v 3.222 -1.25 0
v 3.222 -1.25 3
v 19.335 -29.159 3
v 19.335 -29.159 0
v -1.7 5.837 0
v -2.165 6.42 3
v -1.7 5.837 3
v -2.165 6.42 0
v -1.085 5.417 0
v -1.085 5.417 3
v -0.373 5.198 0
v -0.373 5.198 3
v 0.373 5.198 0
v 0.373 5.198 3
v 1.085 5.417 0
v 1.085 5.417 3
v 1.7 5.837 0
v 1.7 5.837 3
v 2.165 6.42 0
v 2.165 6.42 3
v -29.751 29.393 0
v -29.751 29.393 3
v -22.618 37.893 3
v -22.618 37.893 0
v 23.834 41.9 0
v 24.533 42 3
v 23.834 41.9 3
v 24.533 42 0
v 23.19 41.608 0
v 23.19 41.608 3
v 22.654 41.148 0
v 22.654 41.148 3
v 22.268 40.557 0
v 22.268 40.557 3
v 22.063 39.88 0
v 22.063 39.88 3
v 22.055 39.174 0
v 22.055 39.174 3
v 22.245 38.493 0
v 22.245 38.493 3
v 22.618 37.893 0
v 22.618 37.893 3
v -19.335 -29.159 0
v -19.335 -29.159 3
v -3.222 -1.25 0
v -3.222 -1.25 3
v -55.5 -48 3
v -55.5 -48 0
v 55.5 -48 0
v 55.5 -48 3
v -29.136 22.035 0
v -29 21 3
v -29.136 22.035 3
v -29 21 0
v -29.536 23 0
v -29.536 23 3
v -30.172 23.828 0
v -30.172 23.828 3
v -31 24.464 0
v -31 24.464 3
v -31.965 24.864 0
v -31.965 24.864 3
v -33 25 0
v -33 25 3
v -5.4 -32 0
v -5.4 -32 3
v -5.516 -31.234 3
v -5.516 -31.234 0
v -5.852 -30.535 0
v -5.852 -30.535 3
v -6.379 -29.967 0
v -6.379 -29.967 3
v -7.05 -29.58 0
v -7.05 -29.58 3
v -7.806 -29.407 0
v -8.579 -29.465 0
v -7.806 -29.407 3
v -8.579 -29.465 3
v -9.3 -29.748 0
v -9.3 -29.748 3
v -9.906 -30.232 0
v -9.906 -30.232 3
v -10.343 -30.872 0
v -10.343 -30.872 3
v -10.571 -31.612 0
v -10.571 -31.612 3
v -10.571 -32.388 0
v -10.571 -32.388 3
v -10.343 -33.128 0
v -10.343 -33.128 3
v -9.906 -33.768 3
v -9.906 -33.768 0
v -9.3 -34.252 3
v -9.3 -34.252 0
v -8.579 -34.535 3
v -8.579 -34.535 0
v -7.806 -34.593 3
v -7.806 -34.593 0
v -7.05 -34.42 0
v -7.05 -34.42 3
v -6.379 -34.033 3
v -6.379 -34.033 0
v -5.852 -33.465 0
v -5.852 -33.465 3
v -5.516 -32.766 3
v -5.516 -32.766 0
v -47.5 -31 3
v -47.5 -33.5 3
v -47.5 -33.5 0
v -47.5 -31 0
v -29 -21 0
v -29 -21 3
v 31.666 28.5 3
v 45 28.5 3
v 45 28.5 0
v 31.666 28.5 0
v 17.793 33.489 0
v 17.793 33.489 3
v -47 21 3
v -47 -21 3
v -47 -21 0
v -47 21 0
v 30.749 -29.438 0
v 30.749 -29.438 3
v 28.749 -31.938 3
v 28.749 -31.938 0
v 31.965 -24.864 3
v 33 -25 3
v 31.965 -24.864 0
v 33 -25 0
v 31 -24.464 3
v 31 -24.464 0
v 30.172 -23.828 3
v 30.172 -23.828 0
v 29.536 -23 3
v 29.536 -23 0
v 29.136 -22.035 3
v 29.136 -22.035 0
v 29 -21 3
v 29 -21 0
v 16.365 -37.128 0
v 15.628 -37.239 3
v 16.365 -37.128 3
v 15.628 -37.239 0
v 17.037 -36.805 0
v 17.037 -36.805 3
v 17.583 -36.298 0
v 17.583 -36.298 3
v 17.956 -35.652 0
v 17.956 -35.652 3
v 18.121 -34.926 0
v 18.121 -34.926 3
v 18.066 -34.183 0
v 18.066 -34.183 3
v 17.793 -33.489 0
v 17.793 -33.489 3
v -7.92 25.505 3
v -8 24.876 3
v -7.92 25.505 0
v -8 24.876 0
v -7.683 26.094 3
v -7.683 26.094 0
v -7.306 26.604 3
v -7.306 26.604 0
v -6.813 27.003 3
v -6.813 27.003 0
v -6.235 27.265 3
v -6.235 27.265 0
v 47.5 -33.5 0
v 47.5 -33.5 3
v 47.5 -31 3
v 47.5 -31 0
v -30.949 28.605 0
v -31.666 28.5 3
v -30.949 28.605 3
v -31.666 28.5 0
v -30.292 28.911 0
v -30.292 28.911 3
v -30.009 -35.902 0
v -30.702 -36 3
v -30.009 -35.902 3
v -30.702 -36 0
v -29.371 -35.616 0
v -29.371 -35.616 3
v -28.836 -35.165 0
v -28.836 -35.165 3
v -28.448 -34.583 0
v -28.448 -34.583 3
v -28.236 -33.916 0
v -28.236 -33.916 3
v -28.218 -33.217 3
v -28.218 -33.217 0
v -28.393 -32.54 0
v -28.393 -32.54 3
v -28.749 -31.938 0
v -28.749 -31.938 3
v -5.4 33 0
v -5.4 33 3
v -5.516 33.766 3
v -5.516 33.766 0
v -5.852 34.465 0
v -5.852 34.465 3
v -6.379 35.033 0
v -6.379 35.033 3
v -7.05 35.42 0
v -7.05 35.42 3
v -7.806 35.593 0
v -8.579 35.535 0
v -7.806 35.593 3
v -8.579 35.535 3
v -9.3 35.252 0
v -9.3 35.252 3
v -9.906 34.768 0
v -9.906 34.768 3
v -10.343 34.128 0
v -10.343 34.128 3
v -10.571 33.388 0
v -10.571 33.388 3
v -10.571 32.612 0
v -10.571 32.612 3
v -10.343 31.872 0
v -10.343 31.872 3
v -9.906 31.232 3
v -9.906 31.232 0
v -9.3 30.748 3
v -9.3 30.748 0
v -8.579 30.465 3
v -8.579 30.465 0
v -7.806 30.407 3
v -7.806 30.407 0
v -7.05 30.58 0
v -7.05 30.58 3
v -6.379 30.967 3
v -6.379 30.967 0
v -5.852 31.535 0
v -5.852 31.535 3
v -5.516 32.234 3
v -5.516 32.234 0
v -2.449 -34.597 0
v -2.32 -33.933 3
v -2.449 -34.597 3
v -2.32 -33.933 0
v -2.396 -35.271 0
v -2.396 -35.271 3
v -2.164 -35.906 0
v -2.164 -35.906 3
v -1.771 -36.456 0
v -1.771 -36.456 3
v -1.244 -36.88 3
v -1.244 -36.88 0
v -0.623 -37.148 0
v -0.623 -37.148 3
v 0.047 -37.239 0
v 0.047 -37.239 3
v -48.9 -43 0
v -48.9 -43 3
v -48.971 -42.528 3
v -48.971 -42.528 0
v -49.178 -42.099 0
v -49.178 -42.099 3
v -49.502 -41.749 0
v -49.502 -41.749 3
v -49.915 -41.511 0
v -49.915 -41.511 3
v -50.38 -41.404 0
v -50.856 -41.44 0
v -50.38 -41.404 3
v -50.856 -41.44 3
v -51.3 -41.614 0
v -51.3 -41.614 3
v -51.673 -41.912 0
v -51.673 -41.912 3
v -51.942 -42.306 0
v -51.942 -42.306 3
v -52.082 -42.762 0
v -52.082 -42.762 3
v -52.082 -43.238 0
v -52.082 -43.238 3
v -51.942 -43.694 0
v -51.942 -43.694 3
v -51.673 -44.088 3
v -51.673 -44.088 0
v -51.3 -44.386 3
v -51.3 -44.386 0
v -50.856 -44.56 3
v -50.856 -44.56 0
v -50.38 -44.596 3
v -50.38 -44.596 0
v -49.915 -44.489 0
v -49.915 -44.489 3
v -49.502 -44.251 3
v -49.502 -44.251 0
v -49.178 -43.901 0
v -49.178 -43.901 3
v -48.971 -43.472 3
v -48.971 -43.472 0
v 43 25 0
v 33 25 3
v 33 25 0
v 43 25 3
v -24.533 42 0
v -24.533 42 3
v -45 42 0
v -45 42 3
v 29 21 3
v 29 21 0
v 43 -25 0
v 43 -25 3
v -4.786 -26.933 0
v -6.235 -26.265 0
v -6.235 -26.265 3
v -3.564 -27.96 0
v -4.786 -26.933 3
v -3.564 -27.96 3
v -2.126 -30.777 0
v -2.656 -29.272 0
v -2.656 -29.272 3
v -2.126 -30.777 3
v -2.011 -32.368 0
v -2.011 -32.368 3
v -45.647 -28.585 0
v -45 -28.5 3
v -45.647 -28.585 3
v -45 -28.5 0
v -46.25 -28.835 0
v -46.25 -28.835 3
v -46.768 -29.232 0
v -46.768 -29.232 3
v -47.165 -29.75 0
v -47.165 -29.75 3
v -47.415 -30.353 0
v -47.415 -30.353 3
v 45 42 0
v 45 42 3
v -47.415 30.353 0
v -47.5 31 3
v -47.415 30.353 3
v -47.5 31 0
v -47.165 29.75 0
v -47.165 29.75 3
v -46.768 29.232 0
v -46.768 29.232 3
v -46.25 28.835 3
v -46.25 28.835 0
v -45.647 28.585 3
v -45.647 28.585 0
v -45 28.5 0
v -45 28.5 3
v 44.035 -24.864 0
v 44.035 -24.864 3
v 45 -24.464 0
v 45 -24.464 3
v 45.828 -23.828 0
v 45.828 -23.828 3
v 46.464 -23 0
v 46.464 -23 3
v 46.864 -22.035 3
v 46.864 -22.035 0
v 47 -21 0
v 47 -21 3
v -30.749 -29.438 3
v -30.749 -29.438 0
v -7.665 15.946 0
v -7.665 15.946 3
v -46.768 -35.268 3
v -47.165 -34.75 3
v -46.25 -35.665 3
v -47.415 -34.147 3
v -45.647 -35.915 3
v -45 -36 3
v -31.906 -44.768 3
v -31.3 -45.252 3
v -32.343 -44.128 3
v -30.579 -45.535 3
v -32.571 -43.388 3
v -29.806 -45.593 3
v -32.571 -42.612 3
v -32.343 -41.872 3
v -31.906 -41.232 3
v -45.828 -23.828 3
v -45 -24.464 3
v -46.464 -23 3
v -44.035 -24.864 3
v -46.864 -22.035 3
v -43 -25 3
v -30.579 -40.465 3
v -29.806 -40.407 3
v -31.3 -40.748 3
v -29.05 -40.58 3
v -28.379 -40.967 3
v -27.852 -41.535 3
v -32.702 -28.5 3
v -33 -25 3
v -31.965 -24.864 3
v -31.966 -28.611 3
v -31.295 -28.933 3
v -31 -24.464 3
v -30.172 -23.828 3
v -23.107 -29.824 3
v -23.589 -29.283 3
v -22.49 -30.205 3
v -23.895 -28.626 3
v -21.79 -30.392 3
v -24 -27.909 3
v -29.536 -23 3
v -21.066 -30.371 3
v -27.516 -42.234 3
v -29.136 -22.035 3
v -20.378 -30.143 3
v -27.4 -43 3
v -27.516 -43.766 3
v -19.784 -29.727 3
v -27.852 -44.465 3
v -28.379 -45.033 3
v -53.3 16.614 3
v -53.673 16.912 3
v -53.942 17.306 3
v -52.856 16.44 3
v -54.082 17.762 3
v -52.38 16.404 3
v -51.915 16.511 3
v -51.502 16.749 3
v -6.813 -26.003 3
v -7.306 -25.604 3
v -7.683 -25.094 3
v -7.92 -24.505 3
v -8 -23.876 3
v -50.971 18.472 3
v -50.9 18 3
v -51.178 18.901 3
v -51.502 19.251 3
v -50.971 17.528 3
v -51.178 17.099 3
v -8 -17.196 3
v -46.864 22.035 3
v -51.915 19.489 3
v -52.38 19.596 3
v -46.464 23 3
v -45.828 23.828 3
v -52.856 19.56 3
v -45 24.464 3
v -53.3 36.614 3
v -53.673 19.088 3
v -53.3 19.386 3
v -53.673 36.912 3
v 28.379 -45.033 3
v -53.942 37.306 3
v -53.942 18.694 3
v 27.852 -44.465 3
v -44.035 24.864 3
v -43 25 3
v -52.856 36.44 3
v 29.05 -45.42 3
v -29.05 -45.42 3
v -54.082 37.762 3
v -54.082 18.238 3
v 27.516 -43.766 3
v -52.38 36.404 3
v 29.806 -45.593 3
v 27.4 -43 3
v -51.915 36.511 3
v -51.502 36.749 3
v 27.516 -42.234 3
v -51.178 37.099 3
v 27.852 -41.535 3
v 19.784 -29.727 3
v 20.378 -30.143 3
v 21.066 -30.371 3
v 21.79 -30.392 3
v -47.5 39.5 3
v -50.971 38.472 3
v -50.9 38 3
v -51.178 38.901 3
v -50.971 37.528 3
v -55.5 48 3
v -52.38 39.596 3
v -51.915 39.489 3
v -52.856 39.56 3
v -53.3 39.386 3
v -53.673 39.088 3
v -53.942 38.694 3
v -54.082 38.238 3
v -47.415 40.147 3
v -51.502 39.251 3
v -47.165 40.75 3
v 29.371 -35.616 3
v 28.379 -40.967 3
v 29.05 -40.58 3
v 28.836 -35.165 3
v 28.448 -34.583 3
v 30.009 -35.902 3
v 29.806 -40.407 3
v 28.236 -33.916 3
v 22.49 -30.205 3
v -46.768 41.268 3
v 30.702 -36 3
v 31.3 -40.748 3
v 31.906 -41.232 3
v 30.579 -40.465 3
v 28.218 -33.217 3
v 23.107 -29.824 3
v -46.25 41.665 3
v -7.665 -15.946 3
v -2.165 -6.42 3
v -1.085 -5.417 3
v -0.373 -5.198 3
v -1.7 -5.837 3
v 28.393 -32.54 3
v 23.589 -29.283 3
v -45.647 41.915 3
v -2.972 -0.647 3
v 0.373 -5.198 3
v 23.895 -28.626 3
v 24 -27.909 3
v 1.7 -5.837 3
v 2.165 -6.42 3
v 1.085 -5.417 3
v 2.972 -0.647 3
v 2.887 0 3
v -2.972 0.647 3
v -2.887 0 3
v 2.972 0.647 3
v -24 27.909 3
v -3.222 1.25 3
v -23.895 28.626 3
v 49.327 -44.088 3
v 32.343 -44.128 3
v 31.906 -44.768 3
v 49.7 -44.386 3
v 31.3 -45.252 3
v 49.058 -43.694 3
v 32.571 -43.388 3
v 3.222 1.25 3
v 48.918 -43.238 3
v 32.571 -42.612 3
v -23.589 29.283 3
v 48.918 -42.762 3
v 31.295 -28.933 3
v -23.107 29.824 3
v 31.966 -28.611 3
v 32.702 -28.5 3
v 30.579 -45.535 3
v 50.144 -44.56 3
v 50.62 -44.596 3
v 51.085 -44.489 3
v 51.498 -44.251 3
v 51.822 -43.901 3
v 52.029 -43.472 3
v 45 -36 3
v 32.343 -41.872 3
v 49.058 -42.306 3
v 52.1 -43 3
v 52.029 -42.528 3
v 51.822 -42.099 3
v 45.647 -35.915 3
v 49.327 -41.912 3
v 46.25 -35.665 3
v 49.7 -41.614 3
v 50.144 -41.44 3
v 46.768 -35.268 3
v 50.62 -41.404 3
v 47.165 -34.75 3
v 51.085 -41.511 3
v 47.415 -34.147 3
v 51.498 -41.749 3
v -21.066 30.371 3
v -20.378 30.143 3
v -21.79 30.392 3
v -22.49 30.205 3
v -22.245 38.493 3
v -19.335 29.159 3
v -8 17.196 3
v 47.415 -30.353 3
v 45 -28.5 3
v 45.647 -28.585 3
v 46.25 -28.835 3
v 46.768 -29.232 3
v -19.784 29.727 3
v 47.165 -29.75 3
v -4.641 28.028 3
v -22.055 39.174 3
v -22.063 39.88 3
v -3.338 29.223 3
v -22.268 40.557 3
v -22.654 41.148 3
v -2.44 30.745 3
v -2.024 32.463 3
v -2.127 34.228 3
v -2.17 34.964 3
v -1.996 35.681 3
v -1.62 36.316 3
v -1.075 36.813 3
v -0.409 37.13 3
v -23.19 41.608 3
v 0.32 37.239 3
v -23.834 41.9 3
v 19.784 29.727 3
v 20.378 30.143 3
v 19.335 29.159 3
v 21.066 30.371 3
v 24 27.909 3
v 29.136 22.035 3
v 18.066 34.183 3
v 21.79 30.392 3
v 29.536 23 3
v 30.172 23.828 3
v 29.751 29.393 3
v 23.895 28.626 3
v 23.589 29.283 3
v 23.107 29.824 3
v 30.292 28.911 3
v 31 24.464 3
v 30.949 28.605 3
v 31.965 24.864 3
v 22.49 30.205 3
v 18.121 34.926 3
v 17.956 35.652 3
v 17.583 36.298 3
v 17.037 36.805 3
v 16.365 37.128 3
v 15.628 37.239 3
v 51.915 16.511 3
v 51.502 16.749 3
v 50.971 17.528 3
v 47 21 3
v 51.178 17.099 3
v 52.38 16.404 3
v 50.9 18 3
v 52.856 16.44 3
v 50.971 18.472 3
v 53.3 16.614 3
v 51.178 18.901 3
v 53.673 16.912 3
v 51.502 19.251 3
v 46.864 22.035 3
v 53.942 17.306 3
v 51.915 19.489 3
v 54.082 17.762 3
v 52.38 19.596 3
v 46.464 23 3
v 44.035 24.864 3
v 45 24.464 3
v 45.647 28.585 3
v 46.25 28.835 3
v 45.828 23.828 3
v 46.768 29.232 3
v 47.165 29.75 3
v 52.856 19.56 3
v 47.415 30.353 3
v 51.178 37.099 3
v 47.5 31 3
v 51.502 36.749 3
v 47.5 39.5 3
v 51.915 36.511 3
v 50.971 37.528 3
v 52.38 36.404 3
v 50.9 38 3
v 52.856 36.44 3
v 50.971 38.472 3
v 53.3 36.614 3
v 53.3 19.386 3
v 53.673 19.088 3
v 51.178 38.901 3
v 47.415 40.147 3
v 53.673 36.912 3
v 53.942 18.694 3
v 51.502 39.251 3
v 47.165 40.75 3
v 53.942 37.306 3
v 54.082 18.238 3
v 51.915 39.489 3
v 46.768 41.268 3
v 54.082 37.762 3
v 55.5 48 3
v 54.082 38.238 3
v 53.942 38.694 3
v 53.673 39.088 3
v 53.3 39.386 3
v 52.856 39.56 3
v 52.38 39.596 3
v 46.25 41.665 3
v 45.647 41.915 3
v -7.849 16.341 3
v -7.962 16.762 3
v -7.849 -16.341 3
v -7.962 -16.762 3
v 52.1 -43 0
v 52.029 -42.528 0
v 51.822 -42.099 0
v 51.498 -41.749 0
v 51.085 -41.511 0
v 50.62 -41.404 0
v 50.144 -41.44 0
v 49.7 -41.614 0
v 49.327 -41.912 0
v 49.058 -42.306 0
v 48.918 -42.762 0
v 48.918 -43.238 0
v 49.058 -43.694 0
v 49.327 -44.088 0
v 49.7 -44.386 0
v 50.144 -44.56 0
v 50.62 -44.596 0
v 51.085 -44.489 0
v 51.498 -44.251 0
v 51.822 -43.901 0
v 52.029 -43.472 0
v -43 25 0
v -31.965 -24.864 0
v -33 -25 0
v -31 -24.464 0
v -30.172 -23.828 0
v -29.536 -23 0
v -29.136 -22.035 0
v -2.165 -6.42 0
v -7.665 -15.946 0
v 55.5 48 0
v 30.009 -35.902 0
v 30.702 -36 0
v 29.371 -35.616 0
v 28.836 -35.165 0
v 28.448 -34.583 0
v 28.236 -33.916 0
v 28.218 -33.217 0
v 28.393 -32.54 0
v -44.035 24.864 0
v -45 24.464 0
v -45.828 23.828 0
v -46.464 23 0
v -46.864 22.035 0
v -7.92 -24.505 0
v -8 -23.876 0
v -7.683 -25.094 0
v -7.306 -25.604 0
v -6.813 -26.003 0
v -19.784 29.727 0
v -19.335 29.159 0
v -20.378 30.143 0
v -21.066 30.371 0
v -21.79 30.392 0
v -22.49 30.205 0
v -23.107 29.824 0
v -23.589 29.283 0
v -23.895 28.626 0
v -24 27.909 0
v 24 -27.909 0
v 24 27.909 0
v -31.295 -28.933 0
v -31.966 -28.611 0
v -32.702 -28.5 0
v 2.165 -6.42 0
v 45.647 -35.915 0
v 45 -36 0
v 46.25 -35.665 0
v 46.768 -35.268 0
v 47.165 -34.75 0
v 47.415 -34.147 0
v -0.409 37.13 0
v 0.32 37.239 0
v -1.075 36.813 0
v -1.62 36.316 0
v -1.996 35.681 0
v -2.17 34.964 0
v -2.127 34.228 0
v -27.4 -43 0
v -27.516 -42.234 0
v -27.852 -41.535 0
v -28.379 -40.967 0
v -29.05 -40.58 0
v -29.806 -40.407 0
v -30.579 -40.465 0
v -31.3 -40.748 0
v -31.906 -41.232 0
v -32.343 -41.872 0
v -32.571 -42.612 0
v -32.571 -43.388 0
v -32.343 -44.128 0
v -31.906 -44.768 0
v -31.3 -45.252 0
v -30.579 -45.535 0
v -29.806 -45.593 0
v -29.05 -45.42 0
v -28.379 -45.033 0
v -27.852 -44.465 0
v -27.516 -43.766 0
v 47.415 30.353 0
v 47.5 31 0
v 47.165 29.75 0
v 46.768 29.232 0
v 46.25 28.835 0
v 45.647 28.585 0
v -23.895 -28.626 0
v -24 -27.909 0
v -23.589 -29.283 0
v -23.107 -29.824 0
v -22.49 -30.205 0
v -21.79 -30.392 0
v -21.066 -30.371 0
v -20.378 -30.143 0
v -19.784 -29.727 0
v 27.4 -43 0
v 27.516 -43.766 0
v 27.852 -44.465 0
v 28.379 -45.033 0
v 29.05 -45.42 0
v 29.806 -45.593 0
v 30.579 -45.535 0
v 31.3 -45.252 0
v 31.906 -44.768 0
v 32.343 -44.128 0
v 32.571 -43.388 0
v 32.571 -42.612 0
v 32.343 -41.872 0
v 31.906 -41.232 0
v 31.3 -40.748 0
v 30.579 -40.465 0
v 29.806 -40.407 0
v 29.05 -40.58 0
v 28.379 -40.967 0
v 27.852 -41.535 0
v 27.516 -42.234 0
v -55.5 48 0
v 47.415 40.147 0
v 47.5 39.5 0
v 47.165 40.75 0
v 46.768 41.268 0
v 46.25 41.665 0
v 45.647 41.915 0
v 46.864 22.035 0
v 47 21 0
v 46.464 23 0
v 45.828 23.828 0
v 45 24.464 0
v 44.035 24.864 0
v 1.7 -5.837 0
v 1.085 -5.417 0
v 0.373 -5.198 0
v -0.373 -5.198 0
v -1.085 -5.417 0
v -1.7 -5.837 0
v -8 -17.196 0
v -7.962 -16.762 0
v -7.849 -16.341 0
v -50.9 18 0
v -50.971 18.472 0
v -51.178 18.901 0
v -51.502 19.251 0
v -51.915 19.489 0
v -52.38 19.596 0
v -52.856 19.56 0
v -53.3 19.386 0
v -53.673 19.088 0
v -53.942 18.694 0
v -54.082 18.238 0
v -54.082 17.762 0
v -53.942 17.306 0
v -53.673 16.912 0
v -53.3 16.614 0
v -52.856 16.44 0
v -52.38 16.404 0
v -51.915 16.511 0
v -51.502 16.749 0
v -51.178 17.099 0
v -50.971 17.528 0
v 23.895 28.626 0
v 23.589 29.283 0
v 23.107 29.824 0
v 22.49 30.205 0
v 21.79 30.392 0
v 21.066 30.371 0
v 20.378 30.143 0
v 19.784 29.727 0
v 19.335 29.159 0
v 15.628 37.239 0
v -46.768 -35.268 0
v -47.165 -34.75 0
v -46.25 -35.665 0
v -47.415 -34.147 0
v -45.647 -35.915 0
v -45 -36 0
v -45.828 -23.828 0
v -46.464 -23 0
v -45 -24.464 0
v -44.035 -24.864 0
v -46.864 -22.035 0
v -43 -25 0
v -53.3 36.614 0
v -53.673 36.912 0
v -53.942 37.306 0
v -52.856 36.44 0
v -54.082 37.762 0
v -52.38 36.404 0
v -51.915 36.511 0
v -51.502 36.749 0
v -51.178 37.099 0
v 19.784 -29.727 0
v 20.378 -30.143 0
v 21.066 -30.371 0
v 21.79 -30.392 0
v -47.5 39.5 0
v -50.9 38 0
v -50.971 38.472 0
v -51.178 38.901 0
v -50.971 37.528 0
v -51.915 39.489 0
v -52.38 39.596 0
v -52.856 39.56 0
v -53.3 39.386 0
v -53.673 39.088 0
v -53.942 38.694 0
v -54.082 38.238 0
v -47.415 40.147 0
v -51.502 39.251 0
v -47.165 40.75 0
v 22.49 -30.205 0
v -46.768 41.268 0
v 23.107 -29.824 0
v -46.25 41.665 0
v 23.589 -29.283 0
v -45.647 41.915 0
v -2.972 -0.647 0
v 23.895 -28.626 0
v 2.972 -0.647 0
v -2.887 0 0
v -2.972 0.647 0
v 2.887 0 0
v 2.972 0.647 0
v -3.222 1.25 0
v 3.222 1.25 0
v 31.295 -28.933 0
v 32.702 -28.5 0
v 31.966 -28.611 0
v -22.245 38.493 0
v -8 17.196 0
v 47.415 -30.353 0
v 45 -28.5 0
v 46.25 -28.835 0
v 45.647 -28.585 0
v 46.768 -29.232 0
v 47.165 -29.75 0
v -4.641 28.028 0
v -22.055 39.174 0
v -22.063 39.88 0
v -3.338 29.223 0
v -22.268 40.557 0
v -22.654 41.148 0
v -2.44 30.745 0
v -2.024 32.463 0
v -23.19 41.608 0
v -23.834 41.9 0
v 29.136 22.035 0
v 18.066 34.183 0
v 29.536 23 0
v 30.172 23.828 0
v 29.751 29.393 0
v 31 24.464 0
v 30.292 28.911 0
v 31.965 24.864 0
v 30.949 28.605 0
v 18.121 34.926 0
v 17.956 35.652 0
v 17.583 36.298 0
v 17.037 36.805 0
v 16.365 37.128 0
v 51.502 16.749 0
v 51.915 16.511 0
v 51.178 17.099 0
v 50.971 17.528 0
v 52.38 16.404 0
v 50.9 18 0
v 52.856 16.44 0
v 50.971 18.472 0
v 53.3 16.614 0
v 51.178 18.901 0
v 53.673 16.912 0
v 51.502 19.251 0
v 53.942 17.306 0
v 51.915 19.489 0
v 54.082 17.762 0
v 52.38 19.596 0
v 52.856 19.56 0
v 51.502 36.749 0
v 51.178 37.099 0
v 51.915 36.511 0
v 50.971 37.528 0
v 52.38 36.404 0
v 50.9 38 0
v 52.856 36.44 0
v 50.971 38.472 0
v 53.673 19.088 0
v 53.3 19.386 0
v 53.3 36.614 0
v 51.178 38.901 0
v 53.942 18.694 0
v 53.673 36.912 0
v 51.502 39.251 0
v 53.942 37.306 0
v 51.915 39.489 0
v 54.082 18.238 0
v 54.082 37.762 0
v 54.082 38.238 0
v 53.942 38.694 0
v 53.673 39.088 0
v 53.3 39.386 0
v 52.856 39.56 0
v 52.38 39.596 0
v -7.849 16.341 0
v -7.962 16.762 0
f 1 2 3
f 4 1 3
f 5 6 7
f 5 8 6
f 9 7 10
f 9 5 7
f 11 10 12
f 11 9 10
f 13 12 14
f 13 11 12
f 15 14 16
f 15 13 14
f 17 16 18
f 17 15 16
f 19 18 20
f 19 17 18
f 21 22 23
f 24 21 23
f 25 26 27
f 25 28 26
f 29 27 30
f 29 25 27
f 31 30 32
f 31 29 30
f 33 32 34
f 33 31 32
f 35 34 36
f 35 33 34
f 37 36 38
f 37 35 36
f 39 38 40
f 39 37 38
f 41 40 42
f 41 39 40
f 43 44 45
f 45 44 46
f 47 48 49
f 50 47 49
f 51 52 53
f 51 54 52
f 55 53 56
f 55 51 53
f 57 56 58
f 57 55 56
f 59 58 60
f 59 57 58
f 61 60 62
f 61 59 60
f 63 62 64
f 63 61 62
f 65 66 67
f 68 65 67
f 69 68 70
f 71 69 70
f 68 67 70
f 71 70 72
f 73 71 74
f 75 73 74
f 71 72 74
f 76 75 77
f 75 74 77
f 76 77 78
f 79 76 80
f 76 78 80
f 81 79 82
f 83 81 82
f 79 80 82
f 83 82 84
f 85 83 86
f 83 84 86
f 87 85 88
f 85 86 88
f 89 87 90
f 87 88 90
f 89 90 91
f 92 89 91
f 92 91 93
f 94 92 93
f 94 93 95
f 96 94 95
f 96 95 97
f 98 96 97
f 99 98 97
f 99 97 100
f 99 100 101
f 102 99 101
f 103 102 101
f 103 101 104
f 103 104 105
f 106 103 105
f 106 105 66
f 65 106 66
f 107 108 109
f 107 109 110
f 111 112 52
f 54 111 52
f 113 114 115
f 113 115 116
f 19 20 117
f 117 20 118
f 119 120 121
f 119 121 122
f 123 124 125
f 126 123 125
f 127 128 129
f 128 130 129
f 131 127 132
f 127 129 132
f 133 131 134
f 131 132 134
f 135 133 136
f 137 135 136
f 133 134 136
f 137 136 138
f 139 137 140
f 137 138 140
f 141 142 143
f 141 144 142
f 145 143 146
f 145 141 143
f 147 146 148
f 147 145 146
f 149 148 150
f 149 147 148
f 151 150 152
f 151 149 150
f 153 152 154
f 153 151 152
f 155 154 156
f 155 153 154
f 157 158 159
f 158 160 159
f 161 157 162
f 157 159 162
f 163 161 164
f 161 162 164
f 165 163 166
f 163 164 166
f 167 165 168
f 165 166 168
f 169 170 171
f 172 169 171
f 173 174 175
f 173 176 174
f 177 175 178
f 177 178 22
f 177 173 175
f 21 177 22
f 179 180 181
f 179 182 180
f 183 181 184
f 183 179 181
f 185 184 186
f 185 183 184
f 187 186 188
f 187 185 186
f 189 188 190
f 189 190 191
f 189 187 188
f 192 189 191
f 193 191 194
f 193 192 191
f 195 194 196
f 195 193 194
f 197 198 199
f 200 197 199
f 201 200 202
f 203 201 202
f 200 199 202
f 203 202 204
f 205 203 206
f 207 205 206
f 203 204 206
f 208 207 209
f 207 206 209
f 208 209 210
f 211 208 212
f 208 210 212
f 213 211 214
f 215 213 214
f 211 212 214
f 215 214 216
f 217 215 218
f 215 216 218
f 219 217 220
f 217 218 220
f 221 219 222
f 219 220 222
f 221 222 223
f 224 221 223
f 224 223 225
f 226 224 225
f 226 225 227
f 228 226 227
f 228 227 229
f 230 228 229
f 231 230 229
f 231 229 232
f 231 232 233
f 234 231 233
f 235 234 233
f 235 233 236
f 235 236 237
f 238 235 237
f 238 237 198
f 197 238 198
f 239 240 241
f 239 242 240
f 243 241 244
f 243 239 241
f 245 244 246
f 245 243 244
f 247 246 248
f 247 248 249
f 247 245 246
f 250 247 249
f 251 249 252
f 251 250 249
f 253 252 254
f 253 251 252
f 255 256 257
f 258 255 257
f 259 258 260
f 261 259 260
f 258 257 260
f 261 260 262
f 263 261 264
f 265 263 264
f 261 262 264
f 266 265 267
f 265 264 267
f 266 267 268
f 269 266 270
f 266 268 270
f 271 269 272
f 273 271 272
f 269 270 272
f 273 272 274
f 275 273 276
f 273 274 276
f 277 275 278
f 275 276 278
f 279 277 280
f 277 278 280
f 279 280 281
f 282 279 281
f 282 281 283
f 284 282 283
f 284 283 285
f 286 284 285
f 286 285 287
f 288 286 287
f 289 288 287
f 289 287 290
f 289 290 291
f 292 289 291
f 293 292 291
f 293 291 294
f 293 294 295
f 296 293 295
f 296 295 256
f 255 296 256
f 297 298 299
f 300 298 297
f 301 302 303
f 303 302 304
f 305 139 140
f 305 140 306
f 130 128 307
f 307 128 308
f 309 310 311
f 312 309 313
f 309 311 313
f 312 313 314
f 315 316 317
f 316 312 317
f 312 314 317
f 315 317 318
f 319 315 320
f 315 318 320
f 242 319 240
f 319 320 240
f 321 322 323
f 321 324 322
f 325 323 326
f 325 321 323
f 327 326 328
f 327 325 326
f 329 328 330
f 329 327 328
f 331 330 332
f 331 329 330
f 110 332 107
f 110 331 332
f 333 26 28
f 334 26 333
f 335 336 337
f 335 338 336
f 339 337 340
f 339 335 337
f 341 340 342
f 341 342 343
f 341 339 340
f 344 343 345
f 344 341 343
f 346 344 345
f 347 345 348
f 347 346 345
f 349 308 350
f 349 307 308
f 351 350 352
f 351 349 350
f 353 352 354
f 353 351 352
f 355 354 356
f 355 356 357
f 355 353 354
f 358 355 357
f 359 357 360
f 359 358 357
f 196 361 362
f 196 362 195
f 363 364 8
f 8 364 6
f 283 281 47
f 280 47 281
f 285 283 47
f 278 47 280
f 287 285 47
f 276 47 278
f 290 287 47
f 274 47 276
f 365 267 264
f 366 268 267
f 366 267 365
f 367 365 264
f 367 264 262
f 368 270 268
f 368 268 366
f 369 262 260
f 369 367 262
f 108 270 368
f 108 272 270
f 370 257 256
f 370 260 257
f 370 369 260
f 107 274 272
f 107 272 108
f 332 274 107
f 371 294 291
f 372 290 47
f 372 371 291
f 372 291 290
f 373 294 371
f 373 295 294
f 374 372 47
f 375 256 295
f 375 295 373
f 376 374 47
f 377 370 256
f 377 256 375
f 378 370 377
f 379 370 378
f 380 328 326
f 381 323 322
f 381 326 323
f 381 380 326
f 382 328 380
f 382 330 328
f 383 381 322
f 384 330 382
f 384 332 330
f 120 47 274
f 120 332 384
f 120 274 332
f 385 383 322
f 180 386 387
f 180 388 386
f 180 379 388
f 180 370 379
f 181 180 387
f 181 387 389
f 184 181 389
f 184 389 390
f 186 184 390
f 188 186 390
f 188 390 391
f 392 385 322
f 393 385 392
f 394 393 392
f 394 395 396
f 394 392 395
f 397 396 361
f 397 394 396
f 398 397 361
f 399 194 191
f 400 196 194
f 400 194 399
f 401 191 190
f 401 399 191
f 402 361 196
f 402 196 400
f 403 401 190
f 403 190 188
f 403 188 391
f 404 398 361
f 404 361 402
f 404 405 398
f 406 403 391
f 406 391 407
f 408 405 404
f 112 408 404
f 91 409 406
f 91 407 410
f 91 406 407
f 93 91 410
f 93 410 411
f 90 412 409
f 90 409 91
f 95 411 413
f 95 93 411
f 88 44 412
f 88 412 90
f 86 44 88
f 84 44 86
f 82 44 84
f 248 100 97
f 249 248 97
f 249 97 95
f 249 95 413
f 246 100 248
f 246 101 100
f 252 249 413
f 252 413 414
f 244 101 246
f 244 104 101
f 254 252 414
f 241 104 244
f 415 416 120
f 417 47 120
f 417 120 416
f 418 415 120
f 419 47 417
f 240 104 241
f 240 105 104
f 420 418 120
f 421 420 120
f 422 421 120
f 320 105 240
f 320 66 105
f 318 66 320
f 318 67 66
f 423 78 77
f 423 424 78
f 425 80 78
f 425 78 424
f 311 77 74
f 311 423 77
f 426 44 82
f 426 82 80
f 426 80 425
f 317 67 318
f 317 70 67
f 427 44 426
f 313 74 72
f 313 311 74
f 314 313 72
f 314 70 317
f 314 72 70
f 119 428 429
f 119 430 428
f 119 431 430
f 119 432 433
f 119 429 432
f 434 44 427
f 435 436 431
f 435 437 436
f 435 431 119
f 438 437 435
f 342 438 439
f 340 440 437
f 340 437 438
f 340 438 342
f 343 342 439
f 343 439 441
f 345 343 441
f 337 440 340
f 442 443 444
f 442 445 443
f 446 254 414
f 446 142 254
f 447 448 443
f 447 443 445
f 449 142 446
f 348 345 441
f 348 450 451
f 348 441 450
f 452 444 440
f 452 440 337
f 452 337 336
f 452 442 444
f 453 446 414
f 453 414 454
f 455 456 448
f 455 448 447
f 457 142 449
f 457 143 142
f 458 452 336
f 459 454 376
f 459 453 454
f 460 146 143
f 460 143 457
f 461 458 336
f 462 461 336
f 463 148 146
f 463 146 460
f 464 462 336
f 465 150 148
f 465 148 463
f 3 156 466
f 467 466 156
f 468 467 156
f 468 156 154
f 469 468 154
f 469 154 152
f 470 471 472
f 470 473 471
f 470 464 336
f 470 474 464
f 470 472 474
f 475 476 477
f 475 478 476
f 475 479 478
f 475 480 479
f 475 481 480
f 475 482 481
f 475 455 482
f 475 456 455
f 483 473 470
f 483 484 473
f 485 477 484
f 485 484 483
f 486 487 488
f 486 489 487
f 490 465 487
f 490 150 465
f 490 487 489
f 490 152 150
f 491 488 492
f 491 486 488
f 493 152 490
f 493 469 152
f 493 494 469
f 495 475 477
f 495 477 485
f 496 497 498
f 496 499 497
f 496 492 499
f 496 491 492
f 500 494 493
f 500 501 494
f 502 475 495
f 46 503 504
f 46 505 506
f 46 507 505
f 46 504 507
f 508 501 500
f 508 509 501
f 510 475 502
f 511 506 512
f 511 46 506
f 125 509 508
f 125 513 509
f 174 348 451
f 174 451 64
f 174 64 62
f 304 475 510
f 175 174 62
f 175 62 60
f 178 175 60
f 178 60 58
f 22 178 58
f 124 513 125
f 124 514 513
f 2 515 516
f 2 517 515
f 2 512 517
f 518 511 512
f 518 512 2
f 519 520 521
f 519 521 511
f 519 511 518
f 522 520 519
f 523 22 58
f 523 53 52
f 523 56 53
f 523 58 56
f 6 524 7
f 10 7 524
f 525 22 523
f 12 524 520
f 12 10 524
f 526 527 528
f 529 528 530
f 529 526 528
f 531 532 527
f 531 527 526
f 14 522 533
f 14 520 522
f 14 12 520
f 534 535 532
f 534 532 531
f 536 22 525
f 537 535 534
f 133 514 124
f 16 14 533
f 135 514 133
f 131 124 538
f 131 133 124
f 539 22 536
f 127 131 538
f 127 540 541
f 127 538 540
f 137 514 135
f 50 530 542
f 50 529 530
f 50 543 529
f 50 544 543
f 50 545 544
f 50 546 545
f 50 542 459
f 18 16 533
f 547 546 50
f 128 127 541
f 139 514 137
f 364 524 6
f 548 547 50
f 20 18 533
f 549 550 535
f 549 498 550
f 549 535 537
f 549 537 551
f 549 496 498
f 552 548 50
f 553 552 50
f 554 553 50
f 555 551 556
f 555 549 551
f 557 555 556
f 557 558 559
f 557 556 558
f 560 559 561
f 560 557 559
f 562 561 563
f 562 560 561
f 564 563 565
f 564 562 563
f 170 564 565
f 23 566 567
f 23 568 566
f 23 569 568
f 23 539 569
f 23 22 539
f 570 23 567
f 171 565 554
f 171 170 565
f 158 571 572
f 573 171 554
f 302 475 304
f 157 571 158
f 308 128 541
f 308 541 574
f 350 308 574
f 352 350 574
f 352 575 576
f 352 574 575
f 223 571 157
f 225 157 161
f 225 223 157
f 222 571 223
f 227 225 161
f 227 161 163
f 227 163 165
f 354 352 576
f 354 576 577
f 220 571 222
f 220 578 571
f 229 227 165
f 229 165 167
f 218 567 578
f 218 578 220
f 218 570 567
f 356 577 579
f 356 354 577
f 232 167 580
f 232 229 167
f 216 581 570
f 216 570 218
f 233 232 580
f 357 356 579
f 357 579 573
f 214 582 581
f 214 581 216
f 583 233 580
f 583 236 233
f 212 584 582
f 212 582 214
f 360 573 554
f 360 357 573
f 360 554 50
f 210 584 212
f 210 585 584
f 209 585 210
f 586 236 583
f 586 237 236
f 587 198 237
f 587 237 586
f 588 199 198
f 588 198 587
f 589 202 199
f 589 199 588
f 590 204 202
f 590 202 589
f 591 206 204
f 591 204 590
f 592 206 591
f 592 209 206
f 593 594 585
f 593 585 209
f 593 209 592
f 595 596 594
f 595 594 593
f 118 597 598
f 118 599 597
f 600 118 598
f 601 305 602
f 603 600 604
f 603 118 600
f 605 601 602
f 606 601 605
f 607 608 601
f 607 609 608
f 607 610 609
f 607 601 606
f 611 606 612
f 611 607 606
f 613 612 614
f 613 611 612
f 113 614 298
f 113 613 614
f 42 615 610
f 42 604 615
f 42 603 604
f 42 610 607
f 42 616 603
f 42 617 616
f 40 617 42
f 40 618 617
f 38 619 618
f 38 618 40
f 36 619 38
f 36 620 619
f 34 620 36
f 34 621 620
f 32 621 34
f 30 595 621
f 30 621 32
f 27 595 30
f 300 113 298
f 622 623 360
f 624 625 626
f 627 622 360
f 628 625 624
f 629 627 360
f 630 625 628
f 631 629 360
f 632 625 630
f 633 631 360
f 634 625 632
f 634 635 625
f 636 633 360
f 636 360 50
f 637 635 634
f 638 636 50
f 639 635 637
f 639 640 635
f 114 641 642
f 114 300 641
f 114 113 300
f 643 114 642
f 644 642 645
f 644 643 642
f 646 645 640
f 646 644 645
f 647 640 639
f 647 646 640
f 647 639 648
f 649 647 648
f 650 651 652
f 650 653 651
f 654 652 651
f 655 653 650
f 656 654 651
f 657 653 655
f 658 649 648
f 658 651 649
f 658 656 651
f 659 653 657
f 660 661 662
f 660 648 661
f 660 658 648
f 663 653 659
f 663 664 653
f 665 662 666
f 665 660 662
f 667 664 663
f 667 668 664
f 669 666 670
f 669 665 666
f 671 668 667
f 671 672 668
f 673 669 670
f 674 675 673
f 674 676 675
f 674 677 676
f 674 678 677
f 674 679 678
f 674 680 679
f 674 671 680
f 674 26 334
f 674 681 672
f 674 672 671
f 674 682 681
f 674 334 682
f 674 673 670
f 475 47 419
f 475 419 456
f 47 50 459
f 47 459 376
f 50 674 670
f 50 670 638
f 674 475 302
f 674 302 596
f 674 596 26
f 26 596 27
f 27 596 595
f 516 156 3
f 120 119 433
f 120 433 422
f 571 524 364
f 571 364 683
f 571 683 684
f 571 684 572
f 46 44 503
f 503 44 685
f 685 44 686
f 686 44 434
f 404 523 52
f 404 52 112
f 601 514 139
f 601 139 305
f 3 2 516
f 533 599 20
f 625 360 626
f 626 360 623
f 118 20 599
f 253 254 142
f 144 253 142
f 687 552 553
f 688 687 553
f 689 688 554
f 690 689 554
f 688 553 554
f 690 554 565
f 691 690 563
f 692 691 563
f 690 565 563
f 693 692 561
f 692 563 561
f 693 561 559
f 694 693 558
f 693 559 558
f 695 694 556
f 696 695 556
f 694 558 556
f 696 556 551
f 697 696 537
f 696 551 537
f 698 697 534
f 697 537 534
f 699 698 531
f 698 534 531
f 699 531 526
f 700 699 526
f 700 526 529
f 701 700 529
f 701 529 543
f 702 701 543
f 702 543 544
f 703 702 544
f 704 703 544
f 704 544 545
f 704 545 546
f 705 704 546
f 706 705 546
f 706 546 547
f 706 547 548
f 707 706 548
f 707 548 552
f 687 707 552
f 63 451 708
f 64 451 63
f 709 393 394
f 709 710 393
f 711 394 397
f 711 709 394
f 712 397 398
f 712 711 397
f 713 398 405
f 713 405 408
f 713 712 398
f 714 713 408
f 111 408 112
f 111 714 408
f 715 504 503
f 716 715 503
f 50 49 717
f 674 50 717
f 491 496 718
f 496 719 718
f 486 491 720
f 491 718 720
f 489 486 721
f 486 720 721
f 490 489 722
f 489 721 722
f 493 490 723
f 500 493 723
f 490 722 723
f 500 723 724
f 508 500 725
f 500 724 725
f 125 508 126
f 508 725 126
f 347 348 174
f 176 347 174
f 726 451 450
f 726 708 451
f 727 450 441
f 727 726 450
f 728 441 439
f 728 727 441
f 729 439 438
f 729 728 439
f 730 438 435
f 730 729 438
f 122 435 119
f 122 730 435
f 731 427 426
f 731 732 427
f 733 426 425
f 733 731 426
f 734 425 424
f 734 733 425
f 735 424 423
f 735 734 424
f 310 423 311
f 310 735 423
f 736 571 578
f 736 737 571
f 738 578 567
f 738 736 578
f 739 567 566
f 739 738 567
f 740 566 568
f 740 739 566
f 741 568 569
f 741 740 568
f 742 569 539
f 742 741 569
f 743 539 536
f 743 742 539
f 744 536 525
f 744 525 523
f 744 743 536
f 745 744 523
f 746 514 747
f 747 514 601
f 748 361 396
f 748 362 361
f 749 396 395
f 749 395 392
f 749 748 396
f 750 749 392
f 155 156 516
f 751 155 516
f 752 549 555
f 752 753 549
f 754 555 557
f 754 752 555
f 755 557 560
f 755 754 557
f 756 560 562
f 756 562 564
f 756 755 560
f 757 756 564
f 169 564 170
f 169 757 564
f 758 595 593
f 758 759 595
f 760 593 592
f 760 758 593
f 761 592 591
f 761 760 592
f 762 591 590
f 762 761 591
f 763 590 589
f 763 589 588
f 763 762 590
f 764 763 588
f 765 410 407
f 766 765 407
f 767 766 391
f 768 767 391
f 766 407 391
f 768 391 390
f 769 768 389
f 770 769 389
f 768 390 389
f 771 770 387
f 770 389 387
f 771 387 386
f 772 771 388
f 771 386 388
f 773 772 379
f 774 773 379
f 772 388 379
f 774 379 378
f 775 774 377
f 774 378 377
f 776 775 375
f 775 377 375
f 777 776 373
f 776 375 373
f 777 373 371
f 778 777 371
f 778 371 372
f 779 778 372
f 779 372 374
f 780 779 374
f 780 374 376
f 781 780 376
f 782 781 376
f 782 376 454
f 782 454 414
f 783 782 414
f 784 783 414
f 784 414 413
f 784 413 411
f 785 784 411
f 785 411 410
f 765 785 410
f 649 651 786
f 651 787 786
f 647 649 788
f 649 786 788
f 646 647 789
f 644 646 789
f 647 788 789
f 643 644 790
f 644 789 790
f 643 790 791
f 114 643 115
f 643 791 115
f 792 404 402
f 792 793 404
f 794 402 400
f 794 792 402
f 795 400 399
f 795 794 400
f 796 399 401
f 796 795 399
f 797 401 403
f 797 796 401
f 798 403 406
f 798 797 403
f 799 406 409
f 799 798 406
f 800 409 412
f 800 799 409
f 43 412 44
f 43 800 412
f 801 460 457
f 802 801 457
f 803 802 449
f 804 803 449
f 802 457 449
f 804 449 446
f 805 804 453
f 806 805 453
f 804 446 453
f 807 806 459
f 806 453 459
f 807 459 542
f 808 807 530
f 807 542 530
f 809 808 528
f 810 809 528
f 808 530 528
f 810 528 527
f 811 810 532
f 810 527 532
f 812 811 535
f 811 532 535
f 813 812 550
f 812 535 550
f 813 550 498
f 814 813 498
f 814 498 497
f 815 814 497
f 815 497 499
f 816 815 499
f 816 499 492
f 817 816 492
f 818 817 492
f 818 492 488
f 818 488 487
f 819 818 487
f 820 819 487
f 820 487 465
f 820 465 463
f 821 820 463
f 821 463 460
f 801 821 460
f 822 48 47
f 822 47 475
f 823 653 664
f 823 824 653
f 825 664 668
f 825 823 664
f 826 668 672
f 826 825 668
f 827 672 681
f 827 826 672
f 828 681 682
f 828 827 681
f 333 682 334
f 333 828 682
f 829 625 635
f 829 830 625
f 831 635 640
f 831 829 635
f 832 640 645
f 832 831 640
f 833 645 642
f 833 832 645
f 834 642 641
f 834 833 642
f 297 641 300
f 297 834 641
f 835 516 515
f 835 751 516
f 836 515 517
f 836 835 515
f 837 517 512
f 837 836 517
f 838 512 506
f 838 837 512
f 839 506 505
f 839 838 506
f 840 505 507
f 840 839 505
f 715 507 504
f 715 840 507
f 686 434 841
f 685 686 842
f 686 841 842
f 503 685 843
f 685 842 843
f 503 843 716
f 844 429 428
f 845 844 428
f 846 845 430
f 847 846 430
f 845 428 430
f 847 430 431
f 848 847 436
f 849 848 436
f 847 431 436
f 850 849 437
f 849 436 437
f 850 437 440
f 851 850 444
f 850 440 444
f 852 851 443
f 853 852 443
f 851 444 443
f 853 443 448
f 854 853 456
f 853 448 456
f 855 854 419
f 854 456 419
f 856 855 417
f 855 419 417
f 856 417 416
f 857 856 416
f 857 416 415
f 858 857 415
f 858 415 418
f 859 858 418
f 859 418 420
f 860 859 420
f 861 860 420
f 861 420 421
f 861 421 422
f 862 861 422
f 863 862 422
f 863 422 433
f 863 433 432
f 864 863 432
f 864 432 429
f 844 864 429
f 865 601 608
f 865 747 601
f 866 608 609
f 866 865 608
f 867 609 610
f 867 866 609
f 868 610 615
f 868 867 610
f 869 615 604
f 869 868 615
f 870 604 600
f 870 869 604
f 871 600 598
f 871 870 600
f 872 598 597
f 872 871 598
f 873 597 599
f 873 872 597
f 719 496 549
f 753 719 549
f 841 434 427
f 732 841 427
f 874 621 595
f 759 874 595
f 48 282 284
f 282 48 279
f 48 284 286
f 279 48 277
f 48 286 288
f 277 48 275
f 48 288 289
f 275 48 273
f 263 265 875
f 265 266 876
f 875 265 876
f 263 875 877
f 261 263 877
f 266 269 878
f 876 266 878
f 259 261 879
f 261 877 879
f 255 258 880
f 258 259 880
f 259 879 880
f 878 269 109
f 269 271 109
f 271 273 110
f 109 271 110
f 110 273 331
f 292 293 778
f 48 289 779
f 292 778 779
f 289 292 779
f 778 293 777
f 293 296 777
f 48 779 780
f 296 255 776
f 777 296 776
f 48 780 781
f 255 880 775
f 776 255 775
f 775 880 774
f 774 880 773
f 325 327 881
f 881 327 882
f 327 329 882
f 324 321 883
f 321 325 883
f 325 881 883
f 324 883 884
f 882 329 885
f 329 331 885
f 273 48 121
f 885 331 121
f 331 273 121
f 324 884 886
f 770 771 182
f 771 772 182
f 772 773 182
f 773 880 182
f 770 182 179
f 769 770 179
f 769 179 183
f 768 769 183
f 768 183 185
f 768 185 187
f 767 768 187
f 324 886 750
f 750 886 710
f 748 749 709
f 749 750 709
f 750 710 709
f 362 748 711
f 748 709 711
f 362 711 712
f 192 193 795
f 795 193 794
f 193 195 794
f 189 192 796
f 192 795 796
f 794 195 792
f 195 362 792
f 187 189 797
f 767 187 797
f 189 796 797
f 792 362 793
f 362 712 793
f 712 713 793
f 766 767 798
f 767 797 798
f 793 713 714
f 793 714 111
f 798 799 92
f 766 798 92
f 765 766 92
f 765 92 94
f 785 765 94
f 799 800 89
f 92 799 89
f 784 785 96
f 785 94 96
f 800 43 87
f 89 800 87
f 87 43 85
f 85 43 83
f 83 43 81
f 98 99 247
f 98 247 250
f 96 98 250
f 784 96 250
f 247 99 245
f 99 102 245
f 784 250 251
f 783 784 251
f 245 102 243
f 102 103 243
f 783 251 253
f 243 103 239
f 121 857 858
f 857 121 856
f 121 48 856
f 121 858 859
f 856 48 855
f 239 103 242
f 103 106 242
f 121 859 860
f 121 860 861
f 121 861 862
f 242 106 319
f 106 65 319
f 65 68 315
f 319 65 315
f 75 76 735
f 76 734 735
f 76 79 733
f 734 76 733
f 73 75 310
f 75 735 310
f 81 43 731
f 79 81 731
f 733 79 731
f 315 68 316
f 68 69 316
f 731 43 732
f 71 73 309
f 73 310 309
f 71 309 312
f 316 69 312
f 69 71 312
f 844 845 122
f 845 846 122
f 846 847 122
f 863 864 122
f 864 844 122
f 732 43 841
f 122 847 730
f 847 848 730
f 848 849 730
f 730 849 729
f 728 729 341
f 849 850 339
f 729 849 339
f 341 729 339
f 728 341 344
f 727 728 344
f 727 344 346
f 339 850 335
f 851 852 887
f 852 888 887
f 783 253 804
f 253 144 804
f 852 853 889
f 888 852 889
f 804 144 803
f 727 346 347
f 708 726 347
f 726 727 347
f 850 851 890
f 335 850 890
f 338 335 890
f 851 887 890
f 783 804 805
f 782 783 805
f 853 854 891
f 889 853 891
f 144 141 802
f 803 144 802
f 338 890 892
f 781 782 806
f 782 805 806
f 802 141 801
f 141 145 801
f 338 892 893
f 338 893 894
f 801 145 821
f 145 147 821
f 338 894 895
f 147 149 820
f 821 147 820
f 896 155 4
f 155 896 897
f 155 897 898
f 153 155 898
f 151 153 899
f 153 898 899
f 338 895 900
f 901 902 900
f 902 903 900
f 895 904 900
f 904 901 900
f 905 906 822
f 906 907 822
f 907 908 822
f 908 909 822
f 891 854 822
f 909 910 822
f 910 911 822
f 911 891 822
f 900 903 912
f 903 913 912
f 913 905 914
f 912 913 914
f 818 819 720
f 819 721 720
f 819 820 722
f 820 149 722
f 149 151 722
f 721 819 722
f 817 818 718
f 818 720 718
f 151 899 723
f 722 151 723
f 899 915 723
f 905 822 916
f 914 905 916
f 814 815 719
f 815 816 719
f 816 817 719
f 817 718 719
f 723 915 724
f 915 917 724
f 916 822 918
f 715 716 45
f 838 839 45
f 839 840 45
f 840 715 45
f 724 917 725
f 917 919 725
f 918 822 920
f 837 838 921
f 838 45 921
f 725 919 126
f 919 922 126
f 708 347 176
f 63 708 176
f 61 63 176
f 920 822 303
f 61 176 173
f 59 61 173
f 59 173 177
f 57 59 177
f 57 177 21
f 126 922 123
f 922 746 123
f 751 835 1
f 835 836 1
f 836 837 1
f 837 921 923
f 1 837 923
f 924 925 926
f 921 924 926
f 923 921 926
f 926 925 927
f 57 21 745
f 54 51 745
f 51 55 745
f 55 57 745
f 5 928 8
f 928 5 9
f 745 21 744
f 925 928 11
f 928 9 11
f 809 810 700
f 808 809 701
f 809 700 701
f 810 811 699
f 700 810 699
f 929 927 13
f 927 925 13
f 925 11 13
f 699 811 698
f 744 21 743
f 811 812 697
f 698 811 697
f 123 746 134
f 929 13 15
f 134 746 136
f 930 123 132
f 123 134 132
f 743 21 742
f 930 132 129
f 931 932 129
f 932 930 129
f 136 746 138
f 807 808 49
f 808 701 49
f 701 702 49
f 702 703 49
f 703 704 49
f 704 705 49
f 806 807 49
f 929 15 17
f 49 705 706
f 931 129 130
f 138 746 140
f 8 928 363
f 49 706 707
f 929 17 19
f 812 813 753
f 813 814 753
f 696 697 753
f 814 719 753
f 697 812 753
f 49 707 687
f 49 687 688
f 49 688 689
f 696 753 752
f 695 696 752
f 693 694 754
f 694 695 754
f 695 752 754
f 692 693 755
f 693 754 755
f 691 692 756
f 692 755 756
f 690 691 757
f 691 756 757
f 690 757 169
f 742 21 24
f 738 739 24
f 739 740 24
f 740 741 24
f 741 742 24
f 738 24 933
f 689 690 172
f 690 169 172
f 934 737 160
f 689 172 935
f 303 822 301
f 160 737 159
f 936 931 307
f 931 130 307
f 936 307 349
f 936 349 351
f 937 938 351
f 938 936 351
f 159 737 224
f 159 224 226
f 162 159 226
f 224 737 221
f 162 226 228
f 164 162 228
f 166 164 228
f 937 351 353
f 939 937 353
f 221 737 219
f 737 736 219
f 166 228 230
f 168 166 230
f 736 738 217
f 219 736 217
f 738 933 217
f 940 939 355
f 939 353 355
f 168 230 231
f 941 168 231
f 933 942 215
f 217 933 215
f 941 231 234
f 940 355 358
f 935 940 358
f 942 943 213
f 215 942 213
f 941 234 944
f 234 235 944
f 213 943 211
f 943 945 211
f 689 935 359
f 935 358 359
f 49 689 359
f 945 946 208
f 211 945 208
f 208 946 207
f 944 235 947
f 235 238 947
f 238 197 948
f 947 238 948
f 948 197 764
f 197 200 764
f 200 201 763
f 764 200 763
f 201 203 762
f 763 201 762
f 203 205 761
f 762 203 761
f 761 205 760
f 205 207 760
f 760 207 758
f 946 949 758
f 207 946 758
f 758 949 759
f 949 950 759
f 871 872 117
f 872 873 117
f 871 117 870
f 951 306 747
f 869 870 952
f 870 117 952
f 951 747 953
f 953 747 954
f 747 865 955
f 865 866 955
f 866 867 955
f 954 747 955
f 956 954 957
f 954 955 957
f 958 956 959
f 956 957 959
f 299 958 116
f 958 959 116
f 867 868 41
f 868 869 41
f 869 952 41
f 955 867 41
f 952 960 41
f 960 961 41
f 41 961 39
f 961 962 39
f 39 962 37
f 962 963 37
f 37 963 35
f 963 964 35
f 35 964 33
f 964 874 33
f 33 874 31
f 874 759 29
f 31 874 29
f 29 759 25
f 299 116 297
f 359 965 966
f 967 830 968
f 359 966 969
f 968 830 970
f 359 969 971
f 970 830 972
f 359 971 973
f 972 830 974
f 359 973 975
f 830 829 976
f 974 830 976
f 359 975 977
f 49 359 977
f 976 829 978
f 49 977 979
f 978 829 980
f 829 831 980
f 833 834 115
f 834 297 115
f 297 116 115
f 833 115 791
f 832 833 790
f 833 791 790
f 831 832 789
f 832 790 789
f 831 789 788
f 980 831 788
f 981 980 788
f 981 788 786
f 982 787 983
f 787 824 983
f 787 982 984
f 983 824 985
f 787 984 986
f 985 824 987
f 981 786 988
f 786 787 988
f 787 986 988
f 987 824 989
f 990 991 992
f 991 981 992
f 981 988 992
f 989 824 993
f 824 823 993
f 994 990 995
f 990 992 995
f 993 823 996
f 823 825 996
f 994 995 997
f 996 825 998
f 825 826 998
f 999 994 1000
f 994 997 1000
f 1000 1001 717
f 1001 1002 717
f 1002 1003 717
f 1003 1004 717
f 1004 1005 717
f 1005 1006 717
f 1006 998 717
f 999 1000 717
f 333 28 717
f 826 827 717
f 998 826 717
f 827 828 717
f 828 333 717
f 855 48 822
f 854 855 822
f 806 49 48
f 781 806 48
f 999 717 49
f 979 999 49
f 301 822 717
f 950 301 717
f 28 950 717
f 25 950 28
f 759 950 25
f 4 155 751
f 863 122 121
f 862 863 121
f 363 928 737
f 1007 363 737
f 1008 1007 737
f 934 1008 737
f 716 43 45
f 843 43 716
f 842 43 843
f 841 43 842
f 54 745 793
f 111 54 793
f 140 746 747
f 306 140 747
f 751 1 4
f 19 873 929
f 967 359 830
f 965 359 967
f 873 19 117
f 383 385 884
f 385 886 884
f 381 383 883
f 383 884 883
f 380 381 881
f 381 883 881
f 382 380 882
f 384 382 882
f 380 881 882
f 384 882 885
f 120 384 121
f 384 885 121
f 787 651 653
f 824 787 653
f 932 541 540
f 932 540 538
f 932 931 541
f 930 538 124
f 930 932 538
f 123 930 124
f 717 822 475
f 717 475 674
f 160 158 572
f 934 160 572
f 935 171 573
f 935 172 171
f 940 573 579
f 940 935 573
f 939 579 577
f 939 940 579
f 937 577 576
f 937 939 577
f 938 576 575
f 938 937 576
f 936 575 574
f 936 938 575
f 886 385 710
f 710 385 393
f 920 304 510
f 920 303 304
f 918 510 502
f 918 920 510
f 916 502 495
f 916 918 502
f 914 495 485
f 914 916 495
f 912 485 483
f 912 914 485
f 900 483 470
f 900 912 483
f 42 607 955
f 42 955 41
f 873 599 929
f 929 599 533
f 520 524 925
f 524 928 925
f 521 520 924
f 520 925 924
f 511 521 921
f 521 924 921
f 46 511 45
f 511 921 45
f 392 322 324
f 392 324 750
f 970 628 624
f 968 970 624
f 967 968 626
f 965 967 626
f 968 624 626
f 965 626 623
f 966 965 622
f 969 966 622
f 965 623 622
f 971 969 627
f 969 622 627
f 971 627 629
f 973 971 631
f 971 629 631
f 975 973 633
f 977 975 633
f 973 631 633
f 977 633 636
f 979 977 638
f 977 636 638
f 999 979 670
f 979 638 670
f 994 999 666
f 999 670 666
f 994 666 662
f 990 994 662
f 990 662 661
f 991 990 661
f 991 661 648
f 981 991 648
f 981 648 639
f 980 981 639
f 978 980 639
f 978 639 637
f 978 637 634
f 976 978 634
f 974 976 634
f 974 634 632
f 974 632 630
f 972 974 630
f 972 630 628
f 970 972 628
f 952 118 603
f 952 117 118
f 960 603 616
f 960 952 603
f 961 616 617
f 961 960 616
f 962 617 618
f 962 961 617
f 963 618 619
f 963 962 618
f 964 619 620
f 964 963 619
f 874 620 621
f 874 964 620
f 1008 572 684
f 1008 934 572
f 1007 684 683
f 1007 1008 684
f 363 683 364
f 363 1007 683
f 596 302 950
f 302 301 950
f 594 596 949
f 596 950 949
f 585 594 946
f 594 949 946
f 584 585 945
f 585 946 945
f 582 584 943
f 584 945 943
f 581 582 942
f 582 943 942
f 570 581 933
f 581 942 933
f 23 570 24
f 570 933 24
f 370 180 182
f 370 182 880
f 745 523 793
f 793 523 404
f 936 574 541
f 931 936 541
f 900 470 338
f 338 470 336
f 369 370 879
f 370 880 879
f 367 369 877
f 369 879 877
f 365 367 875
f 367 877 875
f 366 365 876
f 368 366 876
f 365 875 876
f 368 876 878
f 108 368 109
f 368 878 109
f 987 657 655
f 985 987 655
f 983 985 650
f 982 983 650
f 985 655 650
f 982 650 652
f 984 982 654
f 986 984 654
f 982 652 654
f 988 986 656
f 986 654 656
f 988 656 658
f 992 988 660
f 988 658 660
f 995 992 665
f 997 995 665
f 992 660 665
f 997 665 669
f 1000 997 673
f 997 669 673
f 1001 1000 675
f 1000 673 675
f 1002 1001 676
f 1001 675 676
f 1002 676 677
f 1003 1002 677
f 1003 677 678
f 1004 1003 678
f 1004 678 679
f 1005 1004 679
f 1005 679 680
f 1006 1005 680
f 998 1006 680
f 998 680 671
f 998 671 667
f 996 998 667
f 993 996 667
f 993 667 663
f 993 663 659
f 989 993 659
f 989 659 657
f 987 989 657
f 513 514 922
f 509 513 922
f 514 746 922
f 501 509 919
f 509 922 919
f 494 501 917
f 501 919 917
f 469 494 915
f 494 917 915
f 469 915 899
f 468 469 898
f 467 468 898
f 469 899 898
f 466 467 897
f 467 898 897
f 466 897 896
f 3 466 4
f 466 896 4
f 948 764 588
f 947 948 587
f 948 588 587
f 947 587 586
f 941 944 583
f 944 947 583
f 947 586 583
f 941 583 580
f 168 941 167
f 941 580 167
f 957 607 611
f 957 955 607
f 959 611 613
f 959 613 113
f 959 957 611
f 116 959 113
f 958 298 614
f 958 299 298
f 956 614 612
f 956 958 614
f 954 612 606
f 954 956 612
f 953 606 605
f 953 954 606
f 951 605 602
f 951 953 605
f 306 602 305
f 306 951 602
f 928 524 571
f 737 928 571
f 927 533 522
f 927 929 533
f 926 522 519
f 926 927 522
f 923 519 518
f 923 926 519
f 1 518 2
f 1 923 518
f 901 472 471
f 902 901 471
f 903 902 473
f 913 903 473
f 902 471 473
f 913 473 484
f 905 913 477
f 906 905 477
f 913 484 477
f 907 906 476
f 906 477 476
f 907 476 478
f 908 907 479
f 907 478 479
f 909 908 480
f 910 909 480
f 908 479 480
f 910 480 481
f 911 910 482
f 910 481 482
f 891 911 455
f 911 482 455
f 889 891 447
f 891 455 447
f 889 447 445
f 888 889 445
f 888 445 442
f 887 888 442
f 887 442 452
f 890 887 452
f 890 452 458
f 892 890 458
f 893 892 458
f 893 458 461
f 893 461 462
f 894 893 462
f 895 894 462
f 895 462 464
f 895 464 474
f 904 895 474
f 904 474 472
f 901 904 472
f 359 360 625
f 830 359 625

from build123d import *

# Parameters (mm, degrees)
SKETCH_1_W           = 111
SKETCH_1_H           = 96
EXTRUDE_1_DEPTH      = 3
SKETCH_2_R           = 1.6
CUT_EXTRUDE_1_DEPTH  = 74.438749989
SKETCH_3_R           = 2.6
CUT_EXTRUDE_2_DEPTH  = 74.438749989
SKETCH_4_R           = 1.6
CUT_EXTRUDE_3_DEPTH  = 74.438749989
SKETCH_8_R           = 2.6
CUT_EXTRUDE_10_DEPTH = 74.438749989
SKETCH_5_W           = 18
SKETCH_5_H           = 50
CUT_EXTRUDE_4_DEPTH  = 74.438749989
FILLET_1_R           = 4
CUT_EXTRUDE_8_DEPTH  = 74.438749989
FILLET_2_R           = 2.5
CUT_EXTRUDE_9_DEPTH  = 74.438749989
FILLET_3_R           = 2.5


with BuildPart() as part:
    # 草图1 → 凸台-拉伸1 (new body)
    with BuildSketch(Plane.XY):
        Rectangle(SKETCH_1_W, SKETCH_1_H)
    extrude(amount=EXTRUDE_1_DEPTH)

    # 草图2 → 切除-拉伸1 (cut, through all)
    with BuildSketch(Plane.XY.offset(3)):
        with Locations((-50.5, -43)):
            Circle(SKETCH_2_R)
        with Locations((50.5, -43)):
            Circle(SKETCH_2_R)
    extrude(amount=-CUT_EXTRUDE_1_DEPTH, mode=Mode.SUBTRACT)

    # 草图3 → 切除-拉伸2 (cut, through all)
    with BuildSketch(Plane.XY.offset(3)):
        with Locations((-30, -43)):
            Circle(SKETCH_3_R)
        with Locations(Location((30, -43, 0), (0, 0, 180))):
            Circle(SKETCH_3_R)
    extrude(amount=-CUT_EXTRUDE_2_DEPTH, mode=Mode.SUBTRACT)

    # 草图4 → 切除-拉伸3 (cut, through all)
    with BuildSketch(Plane.XY.offset(3)):
        with Locations((-52.5, 18)):
            Circle(SKETCH_4_R)
        with Locations((-52.5, 38)):
            Circle(SKETCH_4_R)
        with Locations(Location((52.5, 38, 0), (0, 0, 180))):
            Circle(SKETCH_4_R)
        with Locations(Location((52.5, 18, 0), (0, 0, 180))):
            Circle(SKETCH_4_R)
    extrude(amount=-CUT_EXTRUDE_3_DEPTH, mode=Mode.SUBTRACT)

    # 草图8 → 切除-拉伸10 (cut, through all)
    with BuildSketch(Plane.XY.offset(3)):
        with Locations((-8, -32)):
            Circle(SKETCH_8_R)
        with Locations((-8, 33)):
            Circle(SKETCH_8_R)
    extrude(amount=-CUT_EXTRUDE_10_DEPTH, mode=Mode.SUBTRACT)

    # 草图5 → 切除-拉伸4 (cut, through all)
    with BuildSketch(Plane.XY.offset(3)):
        with Locations((-38, 0)):
            Rectangle(SKETCH_5_W, SKETCH_5_H)
        with Locations((38, 0)):
            Rectangle(SKETCH_5_W, SKETCH_5_H)
    extrude(amount=-CUT_EXTRUDE_4_DEPTH, mode=Mode.SUBTRACT)

    # 圆角1
    fillet_1_edges = [part.edges().sort_by_distance(p)[0] for p in [
        (-47, 25, 1.5),
        (-29, 25, 1.5),
        (-29, -25, 1.5),
        (-47, -25, 1.5),
        (47, -25, 1.5),
        (29, -25, 1.5),
        (29, 25, 1.5),
        (47, 25, 1.5),
    ]]
    fillet(fillet_1_edges, radius=FILLET_1_R)

    # 草图6 → 切除-拉伸8 (cut, through all)
    with BuildSketch(Plane.XY.offset(3)):
        with BuildLine():
            ThreePointArc((-3.753813954, 37.239092363), (-2.457683058, 30.70158252), (-8, 27))
            Line((-8, 27), (-8, 16.526279442))
            Line((-8, 16.526279442), (0, 2.669872981))
            Line((0, 2.669872981), (19.958548116, 37.239092363))
            Line((19.958548116, 37.239092363), (-3.753813954, 37.239092363))
        make_face()
        with BuildLine():
            Line((-8, -16.526279442), (-8, -26))
            ThreePointArc((-8, -26), (-2.193342004, -30.489131736), (-5.075634904, -37.239092363))
            Line((-5.075634904, -37.239092363), (19.958548116, -37.239092363))
            Line((19.958548116, -37.239092363), (0, -2.669872981))
            Line((0, -2.669872981), (-8, -16.526279442))
        make_face()
        Polygon((-2.5, 0), (-24, 37.239092363), (-24, -37.239092363), align=None)
        Polygon((24, -37.239092363), (24, 37.239092363), (2.5, 0), align=None)
    extrude(amount=-CUT_EXTRUDE_8_DEPTH, mode=Mode.SUBTRACT)

    # 圆角2
    fillet_2_edges = [part.edges().sort_by_distance(p)[0] for p in [
        (24, -37.239092363, 1.5),
        (2.5, 0, 1.5),
        (24, 37.239092363, 1.5),
        (-8, 27, 1.5),
        (-3.753813954, 37.239092363, 1.5),
        (19.958548116, 37.239092363, 1.5),
        (0, 2.669872981, 1.5),
        (-8, 16.526279442, 1.5),
        (-5.075634904, -37.239092363, 1.5),
        (-8, -26, 1.5),
        (-8, -16.526279442, 1.5),
        (0, -2.669872981, 1.5),
        (19.958548116, -37.239092363, 1.5),
        (-24, -37.239092363, 1.5),
        (-24, 37.239092363, 1.5),
        (-2.5, 0, 1.5),
    ]]
    fillet(fillet_2_edges, radius=FILLET_2_R)

    # 草图7 → 切除-拉伸9 (cut, through all)
    with BuildSketch(Plane.XY.offset(3)):
        Polygon((-19.172154979, 42), (-47.5, 42), (-47.5, 38), (-47.5, 28.5), (-30.5, 28.5), align=None)
        Polygon((-47.5, -36), (-47.5, -28.5), (-31.5, -28.5), (-25.5, -36), align=None)
        Polygon((25.5, -36), (47.5, -36), (47.5, -28.5), (31.5, -28.5), align=None)
        Polygon((47.5, 42), (47.5, 38), (47.5, 28.5), (30.5, 28.5), (19.172154979, 42), align=None)
    extrude(amount=-CUT_EXTRUDE_9_DEPTH, mode=Mode.SUBTRACT)

    # 圆角3
    fillet_3_edges = [part.edges().sort_by_distance(p)[0] for p in [
        (47.5, 42, 1.5),
        (47.5, 28.5, 1.5),
        (30.5, 28.5, 1.5),
        (19.172154979, 42, 1.5),
        (47.5, -36, 1.5),
        (25.5, -36, 1.5),
        (31.5, -28.5, 1.5),
        (47.5, -28.5, 1.5),
        (-47.5, -36, 1.5),
        (-47.5, -28.5, 1.5),
        (-31.5, -28.5, 1.5),
        (-25.5, -36, 1.5),
        (-47.5, 42, 1.5),
        (-19.172154979, 42, 1.5),
        (-30.5, 28.5, 1.5),
        (-47.5, 28.5, 1.5),
    ]]
    fillet(fillet_3_edges, radius=FILLET_3_R)


solid = part.part
